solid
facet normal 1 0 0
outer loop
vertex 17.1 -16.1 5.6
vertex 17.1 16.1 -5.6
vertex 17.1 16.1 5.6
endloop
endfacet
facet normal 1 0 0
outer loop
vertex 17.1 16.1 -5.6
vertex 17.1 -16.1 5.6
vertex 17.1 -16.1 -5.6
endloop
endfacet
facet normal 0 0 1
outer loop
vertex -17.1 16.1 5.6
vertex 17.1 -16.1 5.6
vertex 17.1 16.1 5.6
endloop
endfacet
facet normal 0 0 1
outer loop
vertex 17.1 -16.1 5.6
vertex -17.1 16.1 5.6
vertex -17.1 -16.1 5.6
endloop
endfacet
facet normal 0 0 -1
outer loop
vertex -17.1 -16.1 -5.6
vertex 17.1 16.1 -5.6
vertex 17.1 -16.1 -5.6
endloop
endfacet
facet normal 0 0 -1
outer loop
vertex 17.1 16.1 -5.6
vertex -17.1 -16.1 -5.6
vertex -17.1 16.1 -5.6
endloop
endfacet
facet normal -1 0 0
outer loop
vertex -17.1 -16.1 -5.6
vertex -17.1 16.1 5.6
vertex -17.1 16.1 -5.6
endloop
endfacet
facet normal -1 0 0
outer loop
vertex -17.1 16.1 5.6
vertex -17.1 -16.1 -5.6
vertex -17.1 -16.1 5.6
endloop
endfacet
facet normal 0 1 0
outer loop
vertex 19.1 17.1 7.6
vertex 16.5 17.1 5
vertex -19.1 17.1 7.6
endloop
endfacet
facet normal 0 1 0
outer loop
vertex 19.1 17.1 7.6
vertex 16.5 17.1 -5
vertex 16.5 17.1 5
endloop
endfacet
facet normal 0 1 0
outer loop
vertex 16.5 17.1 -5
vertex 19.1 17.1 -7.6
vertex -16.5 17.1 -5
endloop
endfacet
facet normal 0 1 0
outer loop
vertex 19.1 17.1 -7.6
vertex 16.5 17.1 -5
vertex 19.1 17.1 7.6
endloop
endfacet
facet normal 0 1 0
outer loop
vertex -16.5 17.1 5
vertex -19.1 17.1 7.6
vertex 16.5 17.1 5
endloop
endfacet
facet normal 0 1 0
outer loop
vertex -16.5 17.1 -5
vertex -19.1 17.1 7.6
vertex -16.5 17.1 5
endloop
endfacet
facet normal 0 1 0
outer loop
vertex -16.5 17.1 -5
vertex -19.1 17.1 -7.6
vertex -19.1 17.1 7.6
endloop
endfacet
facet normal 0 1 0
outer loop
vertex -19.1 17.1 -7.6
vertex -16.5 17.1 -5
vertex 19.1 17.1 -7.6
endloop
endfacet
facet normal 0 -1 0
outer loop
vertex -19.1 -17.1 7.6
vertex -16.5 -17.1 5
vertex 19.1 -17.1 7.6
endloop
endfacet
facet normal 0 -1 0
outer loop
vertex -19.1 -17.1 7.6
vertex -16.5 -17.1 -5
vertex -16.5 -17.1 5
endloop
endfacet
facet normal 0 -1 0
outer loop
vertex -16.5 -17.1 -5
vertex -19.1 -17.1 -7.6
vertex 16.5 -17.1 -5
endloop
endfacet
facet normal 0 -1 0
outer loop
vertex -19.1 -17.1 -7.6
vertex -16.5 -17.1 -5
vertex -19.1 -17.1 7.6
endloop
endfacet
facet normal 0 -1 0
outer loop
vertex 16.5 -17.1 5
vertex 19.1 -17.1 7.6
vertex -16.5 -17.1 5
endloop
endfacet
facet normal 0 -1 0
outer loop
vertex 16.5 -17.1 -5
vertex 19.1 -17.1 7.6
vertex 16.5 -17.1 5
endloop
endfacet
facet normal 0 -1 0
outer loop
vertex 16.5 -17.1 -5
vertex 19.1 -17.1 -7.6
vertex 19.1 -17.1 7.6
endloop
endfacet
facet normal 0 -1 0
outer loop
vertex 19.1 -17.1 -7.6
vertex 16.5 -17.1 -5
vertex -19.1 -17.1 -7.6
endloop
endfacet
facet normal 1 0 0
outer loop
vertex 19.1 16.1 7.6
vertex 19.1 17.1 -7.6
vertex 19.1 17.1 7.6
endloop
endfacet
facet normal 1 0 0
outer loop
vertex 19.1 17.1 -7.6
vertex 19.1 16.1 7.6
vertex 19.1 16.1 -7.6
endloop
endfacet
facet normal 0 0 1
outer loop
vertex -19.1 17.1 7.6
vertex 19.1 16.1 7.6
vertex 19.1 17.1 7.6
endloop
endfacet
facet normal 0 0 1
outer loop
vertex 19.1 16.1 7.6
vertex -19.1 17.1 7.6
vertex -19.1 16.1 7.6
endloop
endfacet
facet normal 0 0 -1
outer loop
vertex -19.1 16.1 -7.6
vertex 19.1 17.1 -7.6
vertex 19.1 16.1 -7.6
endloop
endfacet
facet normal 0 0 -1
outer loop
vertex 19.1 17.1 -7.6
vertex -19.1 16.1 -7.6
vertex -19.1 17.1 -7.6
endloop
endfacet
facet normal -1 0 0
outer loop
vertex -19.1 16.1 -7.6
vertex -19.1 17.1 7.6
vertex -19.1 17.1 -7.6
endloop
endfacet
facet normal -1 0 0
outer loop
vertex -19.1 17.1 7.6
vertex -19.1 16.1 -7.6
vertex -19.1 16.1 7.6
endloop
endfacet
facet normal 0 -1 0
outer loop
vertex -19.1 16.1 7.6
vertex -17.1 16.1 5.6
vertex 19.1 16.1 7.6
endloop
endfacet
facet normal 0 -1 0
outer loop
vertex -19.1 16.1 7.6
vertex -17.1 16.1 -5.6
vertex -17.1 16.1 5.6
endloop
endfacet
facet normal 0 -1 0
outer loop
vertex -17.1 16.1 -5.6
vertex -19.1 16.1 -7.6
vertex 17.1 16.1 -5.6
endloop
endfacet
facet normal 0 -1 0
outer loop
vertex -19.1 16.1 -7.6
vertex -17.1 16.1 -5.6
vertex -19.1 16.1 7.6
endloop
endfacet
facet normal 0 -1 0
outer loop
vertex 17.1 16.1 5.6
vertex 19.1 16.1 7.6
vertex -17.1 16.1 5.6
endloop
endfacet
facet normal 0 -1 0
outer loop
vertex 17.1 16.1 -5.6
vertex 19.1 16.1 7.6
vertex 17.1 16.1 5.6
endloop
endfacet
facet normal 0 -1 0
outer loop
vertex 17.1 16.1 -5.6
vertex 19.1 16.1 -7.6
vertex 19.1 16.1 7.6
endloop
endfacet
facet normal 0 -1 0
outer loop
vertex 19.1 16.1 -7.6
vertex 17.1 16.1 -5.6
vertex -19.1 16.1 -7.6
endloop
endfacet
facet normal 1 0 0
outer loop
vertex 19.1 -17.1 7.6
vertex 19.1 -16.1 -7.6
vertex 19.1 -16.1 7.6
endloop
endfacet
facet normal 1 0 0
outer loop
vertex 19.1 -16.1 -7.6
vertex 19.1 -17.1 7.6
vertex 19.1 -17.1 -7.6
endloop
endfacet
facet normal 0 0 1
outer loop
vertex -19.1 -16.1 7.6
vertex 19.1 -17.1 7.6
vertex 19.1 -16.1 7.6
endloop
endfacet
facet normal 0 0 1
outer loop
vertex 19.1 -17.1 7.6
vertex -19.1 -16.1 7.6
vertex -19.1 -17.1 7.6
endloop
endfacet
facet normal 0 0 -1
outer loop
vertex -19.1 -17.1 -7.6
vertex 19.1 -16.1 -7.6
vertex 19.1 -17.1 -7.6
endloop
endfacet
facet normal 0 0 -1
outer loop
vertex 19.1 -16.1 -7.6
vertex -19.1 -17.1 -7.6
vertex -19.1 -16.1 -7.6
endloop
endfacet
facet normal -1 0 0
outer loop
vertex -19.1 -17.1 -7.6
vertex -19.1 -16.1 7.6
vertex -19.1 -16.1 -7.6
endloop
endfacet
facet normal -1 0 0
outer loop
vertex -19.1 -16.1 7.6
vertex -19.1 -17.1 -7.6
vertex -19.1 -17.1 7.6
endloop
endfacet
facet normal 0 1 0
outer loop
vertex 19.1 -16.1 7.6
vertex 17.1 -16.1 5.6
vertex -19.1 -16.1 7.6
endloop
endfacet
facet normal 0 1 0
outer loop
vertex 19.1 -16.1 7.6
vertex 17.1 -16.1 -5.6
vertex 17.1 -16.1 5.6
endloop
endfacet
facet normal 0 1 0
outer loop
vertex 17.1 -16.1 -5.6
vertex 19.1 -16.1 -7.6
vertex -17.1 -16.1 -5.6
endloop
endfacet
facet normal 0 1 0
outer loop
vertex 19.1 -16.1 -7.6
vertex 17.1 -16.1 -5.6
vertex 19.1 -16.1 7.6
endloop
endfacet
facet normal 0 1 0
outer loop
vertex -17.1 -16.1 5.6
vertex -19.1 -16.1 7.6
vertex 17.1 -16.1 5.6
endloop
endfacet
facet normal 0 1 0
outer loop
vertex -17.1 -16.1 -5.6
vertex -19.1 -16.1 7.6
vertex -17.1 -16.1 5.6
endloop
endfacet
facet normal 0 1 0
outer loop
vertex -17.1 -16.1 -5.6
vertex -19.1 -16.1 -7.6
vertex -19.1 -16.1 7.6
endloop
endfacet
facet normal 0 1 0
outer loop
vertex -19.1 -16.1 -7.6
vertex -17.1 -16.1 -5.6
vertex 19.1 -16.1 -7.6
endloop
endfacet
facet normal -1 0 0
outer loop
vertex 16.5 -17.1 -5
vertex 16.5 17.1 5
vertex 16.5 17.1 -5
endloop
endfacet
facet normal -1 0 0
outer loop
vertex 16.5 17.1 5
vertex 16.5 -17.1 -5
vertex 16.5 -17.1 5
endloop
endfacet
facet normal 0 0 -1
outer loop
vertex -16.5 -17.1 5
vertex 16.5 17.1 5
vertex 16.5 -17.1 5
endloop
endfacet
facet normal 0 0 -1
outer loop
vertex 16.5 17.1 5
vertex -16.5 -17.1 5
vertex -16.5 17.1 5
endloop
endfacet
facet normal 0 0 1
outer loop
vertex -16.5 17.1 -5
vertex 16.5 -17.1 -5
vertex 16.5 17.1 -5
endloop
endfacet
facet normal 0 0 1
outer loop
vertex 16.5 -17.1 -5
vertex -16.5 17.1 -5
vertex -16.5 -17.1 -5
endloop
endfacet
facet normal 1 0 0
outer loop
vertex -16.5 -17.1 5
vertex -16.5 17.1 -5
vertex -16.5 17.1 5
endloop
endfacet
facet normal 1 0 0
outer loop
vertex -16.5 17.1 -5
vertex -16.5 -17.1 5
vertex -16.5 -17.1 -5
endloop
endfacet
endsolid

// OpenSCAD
// Copyright: Jetty, 2015
// License: Creative Commons:  Attribution, Non-Commercial, Share-alike: CC BY-NC-SA

manifoldCorrection = 0.01;

// Print with longest dimensions parallel to the bed (with raft / support)

// Top down view, W, L, H
formerThickness			= 0.6;			// Make in multiple of layer thickness
formerInternalDimensions = [33, 33, 10];	// Make a multiple of layer thickness

flangeThickness			= 1;
flangeHeight				= 2;

formerIDimensions 		= [formerInternalDimensions[0],
						   formerInternalDimensions[1] + formerThickness * 2 + manifoldCorrection * 2,
						   formerInternalDimensions[2]];

formerExtenalDimensions  = [formerInternalDimensions[0] + formerThickness * 2,
						   formerInternalDimensions[1] + formerThickness * 2,
						   formerInternalDimensions[2] + formerThickness * 2];
flangeDimensions			= [formerExtenalDimensions[0] + flangeHeight * 2,
						   flangeThickness,
						   formerExtenalDimensions[2] + flangeHeight * 2];
flangeOffset				= [0, ( formerExtenalDimensions[1] - flangeThickness ) / 2, 0]; 

difference()
{
	union()
	{
		cube(formerExtenalDimensions, center=true);
		translate( flangeOffset )
			cube(flangeDimensions, center = true);
		translate( -flangeOffset )
			cube(flangeDimensions, center = true);
	}
	cube(formerIDimensions, center=true);
}
